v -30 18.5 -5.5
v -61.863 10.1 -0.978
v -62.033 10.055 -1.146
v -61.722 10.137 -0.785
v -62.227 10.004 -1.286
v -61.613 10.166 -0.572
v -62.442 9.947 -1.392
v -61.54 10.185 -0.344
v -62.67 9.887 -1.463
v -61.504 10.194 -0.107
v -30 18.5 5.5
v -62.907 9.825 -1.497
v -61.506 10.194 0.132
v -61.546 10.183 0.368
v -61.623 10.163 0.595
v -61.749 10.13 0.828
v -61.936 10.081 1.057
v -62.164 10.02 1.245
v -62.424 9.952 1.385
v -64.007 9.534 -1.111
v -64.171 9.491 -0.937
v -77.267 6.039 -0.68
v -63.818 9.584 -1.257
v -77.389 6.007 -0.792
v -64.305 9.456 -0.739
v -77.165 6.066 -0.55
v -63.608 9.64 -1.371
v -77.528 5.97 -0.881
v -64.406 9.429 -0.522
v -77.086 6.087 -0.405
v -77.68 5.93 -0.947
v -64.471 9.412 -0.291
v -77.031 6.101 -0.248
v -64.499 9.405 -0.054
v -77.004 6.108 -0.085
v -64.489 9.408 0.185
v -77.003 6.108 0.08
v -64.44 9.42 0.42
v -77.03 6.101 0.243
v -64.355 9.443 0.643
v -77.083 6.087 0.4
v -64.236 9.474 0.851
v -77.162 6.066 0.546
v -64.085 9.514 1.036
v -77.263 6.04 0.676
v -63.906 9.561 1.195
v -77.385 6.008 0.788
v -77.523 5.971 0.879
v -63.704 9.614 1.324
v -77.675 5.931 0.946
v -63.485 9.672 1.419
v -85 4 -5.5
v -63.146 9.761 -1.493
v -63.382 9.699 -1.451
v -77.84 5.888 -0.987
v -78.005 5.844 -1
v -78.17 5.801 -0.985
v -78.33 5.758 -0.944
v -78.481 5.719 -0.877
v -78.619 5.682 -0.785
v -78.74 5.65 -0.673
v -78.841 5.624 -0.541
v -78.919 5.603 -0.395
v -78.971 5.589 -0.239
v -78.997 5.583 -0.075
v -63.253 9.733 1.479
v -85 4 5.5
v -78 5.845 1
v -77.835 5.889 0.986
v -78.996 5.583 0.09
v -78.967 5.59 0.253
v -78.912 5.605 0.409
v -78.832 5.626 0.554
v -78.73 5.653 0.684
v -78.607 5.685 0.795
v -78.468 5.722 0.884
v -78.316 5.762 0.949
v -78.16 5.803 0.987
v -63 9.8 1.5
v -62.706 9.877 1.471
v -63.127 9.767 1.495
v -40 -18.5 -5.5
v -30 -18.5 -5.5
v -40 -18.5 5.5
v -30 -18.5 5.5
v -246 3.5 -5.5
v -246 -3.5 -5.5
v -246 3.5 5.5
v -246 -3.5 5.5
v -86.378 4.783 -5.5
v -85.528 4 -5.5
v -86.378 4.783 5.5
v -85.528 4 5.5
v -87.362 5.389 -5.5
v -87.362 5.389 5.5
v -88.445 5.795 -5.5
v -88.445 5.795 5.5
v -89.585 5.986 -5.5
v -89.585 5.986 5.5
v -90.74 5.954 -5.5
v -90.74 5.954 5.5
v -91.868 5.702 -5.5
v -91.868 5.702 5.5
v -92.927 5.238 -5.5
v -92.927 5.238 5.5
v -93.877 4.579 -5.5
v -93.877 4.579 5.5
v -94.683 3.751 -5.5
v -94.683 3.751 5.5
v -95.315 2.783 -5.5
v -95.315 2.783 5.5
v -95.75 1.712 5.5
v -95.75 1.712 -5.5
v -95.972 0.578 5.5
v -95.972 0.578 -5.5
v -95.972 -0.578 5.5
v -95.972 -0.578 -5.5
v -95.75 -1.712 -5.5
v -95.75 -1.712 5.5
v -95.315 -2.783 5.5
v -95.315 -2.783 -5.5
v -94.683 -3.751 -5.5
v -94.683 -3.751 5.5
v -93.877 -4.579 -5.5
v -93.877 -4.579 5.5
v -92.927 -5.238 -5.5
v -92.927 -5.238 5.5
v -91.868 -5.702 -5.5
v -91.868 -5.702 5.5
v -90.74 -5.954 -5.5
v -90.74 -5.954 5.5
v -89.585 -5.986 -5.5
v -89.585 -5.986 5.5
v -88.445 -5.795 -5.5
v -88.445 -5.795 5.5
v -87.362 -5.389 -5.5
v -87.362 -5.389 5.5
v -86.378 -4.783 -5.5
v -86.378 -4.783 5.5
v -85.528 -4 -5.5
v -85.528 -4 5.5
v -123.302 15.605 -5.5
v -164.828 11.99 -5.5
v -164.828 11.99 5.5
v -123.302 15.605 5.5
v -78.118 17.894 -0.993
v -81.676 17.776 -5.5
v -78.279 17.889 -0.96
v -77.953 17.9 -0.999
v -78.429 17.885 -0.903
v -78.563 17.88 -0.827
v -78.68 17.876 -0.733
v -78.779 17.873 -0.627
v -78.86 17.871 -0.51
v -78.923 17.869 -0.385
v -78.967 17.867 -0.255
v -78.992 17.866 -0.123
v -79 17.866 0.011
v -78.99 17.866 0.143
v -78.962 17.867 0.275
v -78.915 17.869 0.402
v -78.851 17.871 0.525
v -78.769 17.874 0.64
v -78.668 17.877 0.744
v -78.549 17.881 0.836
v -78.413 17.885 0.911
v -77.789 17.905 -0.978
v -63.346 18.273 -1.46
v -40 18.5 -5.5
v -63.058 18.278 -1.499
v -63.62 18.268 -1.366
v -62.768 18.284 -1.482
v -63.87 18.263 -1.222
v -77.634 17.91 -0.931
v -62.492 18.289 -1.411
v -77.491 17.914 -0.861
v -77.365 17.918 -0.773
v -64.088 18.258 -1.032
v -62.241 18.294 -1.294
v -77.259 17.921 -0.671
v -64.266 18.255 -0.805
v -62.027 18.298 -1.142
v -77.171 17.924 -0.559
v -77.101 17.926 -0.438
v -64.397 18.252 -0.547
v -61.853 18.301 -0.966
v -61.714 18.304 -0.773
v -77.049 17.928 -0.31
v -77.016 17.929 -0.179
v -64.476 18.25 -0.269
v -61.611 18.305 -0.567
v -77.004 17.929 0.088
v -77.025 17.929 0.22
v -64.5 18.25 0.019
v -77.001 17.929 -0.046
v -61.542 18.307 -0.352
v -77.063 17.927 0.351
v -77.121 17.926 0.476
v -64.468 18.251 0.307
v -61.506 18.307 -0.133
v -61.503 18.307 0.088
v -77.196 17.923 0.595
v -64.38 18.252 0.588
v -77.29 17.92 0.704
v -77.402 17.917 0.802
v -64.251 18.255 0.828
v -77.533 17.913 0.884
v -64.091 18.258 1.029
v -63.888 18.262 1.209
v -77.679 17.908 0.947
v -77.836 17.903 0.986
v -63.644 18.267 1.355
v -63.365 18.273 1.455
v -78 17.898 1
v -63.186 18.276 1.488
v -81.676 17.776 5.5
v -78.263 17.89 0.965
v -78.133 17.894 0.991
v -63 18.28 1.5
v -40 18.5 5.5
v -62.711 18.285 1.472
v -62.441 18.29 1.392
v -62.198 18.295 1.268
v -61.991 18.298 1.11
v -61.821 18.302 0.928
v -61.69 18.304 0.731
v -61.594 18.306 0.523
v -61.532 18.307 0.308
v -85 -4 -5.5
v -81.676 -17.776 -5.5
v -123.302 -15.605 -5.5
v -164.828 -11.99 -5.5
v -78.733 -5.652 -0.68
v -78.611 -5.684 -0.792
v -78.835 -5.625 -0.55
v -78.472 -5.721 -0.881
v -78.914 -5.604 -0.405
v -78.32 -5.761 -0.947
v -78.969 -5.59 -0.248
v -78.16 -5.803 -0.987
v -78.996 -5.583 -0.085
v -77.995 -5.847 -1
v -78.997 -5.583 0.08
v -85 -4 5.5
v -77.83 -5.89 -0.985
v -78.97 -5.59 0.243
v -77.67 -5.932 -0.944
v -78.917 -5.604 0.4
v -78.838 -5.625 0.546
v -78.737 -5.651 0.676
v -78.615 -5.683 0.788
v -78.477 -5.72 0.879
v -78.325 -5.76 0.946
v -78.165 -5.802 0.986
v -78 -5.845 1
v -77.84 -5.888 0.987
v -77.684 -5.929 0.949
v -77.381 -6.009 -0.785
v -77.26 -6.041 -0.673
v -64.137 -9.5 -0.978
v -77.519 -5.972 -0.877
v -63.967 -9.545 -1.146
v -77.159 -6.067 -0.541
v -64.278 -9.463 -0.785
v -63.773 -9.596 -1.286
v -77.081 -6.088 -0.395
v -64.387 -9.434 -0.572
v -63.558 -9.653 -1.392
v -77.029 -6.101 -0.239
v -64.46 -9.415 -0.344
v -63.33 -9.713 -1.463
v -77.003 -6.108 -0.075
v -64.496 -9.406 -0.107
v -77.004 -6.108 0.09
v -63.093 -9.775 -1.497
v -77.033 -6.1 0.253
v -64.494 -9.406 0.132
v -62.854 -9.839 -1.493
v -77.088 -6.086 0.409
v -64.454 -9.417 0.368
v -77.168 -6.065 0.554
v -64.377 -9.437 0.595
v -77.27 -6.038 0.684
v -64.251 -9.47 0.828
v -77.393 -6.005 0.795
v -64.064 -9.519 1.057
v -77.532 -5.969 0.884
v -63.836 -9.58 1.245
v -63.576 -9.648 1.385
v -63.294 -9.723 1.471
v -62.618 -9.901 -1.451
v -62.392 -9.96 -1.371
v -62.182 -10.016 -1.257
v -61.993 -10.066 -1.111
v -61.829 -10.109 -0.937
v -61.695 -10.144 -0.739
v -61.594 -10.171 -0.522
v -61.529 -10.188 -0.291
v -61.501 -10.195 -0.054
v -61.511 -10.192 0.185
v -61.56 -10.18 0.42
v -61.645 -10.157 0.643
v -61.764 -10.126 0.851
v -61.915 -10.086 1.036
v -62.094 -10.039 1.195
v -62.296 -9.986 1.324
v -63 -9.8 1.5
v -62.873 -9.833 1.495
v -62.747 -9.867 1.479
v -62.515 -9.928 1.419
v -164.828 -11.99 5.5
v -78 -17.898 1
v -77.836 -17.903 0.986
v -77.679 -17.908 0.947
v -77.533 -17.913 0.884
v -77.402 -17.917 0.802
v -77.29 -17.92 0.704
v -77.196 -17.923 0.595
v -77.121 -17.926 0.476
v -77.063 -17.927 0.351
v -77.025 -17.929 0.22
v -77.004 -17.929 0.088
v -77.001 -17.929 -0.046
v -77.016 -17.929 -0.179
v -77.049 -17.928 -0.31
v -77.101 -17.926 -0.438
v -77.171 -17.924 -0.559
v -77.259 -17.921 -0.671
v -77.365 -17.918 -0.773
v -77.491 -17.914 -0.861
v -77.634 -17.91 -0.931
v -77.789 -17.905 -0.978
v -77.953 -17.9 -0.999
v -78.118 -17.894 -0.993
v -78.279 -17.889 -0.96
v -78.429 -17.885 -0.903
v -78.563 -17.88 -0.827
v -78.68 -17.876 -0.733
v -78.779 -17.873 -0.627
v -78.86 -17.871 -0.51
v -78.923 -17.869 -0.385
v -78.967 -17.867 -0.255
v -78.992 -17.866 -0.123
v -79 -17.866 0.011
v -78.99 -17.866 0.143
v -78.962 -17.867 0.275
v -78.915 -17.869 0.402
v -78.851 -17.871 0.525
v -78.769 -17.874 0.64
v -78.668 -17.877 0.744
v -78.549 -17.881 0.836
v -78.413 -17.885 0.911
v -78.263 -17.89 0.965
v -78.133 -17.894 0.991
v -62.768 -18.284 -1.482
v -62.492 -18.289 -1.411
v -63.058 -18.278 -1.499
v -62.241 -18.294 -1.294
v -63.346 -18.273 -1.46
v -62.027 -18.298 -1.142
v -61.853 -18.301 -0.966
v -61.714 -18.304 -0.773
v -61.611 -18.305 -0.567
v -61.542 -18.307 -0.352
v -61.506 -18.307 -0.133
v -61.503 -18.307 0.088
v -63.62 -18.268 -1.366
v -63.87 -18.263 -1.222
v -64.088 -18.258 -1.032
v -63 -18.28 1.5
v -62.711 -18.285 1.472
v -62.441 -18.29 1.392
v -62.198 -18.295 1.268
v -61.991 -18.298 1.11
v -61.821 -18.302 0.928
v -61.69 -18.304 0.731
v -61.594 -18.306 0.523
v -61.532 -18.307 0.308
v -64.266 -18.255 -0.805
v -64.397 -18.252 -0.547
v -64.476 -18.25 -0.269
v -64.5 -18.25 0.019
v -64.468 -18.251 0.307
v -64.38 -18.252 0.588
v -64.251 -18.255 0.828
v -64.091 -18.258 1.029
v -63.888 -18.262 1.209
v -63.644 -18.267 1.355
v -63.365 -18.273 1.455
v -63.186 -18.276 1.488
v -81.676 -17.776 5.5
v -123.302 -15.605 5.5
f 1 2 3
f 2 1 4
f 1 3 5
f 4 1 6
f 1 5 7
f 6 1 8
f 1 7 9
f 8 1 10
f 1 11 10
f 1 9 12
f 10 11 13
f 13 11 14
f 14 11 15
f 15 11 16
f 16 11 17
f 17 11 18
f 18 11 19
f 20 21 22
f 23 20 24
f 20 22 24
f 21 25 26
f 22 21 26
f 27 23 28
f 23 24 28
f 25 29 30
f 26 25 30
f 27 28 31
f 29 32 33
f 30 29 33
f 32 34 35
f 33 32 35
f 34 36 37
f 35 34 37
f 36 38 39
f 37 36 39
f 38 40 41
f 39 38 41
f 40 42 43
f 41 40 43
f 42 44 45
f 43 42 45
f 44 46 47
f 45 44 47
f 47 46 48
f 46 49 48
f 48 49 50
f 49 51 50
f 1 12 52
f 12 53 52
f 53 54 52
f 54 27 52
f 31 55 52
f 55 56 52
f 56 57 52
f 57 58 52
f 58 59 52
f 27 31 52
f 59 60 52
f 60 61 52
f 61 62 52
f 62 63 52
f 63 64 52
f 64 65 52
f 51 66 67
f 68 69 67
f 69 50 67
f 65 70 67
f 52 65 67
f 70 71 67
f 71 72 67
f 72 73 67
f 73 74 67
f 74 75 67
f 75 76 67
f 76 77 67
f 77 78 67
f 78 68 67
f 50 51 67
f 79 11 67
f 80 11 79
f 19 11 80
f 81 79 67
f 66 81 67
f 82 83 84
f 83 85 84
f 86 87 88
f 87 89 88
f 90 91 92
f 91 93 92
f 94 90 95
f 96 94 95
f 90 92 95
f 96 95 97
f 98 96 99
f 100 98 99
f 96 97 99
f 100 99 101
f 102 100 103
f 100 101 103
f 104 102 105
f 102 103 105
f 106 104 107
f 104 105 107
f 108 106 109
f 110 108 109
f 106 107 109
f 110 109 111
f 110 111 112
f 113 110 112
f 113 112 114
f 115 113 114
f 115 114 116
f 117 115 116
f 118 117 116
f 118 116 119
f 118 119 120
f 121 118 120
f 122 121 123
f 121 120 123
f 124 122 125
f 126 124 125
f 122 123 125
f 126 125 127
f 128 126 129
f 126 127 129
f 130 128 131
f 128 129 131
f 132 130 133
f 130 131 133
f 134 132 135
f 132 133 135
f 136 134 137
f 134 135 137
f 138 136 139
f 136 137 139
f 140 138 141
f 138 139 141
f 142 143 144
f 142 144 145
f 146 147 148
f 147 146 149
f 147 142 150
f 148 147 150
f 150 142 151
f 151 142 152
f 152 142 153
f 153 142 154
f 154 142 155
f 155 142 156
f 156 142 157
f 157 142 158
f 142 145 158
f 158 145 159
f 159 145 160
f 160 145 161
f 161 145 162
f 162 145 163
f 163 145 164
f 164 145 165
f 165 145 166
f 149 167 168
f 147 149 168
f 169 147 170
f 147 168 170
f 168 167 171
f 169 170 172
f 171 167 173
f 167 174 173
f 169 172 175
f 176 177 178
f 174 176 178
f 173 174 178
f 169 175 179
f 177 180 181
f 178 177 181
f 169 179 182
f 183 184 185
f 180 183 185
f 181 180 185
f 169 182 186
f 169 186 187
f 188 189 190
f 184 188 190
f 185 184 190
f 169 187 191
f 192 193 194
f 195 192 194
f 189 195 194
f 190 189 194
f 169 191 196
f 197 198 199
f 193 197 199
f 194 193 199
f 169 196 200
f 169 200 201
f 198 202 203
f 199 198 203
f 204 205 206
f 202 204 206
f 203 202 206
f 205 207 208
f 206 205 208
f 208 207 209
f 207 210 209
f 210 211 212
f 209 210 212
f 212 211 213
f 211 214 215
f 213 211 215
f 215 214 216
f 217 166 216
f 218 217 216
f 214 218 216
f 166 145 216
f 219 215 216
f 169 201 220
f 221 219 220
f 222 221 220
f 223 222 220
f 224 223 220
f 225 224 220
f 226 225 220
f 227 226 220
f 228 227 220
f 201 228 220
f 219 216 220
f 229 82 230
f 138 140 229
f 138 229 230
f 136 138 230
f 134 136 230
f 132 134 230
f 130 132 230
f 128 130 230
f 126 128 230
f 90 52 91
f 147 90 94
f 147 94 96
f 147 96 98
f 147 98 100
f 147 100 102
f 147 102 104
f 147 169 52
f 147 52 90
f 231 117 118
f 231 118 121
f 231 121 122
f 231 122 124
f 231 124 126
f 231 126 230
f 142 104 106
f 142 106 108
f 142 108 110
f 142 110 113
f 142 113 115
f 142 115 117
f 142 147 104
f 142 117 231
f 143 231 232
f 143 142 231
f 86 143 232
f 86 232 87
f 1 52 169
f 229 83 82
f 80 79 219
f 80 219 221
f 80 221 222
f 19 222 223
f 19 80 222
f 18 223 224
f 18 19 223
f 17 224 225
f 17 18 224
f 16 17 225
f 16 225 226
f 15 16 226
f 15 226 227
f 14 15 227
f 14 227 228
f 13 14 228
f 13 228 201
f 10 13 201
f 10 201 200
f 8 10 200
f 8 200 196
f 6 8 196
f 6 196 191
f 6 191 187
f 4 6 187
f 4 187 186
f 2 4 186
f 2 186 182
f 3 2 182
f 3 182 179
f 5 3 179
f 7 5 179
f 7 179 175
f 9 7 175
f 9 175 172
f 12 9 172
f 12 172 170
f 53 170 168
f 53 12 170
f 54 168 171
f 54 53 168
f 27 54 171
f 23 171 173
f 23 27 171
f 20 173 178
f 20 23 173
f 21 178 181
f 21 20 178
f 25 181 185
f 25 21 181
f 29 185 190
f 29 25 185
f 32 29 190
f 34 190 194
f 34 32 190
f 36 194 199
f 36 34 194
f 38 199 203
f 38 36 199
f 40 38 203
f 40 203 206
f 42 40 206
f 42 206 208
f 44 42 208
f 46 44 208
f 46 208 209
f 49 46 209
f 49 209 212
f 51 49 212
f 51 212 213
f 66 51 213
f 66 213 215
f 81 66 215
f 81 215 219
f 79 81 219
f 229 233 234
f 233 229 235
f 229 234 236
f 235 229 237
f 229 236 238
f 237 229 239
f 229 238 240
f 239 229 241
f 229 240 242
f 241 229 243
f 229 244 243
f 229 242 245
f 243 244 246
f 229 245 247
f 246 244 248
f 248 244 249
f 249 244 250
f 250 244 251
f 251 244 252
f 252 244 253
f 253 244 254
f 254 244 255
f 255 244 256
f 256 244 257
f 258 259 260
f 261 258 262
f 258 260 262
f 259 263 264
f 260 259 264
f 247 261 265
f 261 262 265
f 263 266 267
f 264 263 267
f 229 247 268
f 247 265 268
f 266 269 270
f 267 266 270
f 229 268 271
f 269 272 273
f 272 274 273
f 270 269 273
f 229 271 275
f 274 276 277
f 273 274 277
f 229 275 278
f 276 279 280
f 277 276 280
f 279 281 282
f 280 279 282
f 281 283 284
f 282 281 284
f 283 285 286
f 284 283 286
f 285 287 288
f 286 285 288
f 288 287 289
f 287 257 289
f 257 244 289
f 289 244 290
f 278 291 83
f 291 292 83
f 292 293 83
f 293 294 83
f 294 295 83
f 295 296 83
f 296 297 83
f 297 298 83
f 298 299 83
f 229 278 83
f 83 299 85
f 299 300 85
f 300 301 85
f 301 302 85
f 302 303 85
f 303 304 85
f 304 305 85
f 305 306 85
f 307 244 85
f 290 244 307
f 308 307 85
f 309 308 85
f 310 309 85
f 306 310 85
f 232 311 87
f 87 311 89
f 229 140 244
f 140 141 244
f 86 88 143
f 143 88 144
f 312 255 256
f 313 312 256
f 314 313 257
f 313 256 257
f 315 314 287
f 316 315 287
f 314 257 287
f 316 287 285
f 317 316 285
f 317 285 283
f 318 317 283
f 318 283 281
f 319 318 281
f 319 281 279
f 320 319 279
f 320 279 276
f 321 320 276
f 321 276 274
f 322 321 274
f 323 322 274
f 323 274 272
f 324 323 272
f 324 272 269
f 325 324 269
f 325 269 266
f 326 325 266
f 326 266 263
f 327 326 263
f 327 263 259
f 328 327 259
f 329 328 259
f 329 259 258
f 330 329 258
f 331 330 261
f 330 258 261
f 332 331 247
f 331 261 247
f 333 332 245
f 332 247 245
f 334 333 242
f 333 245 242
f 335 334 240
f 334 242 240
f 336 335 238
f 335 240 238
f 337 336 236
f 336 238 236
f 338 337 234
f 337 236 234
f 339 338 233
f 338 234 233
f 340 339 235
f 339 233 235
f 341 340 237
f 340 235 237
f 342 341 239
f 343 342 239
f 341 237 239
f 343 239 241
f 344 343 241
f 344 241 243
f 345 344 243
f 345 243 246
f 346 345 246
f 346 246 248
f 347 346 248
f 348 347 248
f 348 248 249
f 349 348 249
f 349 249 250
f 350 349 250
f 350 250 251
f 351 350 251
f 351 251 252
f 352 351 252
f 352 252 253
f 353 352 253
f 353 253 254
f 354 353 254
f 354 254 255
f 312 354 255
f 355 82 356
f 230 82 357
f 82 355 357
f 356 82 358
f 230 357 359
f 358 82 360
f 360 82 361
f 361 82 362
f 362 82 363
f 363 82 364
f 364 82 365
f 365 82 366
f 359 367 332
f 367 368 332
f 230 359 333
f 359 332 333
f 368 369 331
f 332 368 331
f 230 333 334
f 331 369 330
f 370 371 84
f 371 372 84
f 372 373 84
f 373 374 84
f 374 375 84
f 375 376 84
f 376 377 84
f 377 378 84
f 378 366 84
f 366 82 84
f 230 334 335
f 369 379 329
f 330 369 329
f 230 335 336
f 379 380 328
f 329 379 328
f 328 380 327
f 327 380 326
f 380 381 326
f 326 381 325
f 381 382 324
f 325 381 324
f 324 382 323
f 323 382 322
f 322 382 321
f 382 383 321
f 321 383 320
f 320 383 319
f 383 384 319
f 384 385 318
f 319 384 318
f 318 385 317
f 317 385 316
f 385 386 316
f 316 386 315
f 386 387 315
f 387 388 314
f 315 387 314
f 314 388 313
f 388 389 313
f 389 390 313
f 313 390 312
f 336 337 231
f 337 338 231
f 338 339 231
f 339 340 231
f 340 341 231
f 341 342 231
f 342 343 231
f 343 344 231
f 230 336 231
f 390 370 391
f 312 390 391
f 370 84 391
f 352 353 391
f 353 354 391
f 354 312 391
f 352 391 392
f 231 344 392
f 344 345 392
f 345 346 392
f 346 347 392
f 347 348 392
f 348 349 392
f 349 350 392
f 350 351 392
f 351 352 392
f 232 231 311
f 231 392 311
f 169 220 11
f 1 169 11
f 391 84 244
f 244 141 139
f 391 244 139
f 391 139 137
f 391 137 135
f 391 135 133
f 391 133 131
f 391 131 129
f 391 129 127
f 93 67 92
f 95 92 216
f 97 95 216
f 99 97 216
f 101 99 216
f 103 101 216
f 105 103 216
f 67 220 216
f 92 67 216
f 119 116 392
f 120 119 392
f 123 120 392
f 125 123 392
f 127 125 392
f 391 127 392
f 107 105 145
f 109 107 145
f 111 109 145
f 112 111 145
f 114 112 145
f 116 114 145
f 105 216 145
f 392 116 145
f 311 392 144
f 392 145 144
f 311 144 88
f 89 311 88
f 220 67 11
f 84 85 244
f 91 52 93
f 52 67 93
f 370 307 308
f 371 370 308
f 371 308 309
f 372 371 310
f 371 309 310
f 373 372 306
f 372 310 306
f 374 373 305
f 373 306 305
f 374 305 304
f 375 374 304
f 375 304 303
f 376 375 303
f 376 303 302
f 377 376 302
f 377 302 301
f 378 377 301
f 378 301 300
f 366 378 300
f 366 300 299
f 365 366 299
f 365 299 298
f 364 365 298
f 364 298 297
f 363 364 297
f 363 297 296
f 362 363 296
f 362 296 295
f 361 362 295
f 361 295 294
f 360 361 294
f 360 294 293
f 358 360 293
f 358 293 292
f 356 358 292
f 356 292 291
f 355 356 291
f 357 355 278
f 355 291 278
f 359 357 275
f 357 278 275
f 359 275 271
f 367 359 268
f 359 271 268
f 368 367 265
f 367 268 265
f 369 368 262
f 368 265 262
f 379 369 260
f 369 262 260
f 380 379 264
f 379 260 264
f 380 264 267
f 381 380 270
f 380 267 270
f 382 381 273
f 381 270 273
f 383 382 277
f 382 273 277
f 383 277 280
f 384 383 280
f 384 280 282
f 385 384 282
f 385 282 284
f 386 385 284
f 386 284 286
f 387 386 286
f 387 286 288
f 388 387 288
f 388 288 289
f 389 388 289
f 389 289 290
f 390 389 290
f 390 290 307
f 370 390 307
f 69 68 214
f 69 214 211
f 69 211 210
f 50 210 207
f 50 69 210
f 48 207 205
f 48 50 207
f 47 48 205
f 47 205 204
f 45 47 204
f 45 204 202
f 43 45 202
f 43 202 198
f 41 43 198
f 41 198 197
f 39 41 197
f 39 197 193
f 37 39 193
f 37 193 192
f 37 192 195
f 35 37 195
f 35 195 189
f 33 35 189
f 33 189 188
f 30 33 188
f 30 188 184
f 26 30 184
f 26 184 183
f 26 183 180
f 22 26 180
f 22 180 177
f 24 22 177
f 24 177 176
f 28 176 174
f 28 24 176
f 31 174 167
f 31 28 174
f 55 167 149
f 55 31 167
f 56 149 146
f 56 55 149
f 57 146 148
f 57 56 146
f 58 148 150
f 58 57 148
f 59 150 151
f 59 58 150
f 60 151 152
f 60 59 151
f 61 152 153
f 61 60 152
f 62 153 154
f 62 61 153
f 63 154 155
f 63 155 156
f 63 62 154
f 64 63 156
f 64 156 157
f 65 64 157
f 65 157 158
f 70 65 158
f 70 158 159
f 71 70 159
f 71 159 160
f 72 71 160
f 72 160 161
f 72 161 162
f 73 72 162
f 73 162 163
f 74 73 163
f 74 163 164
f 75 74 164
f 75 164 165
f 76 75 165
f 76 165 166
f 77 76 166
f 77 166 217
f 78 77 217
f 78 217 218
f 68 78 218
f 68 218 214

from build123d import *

# Parameters (mm, degrees)
EXTRUDE1_DEPTH          = 5.5
SKETCH2_R               = 1.5
SKETCH2_R_2             = 1
CUT_EXTRUDE1_DEPTH      = 19.5
CUT_EXTRUDE1_DEPTH_BACK = 19.5


with BuildPart() as part:
    # Sketch1 → Extrude1 (new body, symmetric)
    with BuildSketch(Plane.XY):
        with BuildLine():
            Line((-40, 18.5), (-30, 18.5))
            Line((-30, 18.5), (-85, 4))
            Line((-85, 4), (-85.527864045, 4))
            ThreePointArc((-85.527864045, 4), (-96, 0), (-85.527864045, -4))
            Line((-85.527864045, -4), (-85, -4))
            Line((-85, -4), (-30, -18.5))
            Line((-30, -18.5), (-40, -18.5))
            ThreePointArc((-40, -18.5), (-102.498734411, -16.871356549), (-164.827821897, -11.989846995))
            Line((-164.827821897, -11.989846995), (-246, -3.5))
            Line((-246, -3.5), (-246, 3.5))
            Line((-246, 3.5), (-164.827821897, 11.989846995))
            ThreePointArc((-164.827821897, 11.989846995), (-102.498734411, 16.871356549), (-40, 18.5))
        make_face()
    extrude(amount=EXTRUDE1_DEPTH, both=True)

    # Sketch2 → Cut-Extrude1 (cut, two sides)
    with BuildSketch(Plane(origin=(0, 0, 0), x_dir=(1, 0, 0), z_dir=(0, 1, 0))) as cut_extrude1_sk:
        with Locations(Location((-63, 0, 0), (0, 0, 270))):  # turned: the seam where the file's is
            Circle(SKETCH2_R)
        with Locations(Location((-78, 0, 0), (0, 0, 270))):  # turned: the seam where the file's is
            Circle(SKETCH2_R_2)
    extrude(amount=CUT_EXTRUDE1_DEPTH, mode=Mode.SUBTRACT)
    extrude(cut_extrude1_sk.sketch, amount=-CUT_EXTRUDE1_DEPTH_BACK, mode=Mode.SUBTRACT)


solid = part.part
